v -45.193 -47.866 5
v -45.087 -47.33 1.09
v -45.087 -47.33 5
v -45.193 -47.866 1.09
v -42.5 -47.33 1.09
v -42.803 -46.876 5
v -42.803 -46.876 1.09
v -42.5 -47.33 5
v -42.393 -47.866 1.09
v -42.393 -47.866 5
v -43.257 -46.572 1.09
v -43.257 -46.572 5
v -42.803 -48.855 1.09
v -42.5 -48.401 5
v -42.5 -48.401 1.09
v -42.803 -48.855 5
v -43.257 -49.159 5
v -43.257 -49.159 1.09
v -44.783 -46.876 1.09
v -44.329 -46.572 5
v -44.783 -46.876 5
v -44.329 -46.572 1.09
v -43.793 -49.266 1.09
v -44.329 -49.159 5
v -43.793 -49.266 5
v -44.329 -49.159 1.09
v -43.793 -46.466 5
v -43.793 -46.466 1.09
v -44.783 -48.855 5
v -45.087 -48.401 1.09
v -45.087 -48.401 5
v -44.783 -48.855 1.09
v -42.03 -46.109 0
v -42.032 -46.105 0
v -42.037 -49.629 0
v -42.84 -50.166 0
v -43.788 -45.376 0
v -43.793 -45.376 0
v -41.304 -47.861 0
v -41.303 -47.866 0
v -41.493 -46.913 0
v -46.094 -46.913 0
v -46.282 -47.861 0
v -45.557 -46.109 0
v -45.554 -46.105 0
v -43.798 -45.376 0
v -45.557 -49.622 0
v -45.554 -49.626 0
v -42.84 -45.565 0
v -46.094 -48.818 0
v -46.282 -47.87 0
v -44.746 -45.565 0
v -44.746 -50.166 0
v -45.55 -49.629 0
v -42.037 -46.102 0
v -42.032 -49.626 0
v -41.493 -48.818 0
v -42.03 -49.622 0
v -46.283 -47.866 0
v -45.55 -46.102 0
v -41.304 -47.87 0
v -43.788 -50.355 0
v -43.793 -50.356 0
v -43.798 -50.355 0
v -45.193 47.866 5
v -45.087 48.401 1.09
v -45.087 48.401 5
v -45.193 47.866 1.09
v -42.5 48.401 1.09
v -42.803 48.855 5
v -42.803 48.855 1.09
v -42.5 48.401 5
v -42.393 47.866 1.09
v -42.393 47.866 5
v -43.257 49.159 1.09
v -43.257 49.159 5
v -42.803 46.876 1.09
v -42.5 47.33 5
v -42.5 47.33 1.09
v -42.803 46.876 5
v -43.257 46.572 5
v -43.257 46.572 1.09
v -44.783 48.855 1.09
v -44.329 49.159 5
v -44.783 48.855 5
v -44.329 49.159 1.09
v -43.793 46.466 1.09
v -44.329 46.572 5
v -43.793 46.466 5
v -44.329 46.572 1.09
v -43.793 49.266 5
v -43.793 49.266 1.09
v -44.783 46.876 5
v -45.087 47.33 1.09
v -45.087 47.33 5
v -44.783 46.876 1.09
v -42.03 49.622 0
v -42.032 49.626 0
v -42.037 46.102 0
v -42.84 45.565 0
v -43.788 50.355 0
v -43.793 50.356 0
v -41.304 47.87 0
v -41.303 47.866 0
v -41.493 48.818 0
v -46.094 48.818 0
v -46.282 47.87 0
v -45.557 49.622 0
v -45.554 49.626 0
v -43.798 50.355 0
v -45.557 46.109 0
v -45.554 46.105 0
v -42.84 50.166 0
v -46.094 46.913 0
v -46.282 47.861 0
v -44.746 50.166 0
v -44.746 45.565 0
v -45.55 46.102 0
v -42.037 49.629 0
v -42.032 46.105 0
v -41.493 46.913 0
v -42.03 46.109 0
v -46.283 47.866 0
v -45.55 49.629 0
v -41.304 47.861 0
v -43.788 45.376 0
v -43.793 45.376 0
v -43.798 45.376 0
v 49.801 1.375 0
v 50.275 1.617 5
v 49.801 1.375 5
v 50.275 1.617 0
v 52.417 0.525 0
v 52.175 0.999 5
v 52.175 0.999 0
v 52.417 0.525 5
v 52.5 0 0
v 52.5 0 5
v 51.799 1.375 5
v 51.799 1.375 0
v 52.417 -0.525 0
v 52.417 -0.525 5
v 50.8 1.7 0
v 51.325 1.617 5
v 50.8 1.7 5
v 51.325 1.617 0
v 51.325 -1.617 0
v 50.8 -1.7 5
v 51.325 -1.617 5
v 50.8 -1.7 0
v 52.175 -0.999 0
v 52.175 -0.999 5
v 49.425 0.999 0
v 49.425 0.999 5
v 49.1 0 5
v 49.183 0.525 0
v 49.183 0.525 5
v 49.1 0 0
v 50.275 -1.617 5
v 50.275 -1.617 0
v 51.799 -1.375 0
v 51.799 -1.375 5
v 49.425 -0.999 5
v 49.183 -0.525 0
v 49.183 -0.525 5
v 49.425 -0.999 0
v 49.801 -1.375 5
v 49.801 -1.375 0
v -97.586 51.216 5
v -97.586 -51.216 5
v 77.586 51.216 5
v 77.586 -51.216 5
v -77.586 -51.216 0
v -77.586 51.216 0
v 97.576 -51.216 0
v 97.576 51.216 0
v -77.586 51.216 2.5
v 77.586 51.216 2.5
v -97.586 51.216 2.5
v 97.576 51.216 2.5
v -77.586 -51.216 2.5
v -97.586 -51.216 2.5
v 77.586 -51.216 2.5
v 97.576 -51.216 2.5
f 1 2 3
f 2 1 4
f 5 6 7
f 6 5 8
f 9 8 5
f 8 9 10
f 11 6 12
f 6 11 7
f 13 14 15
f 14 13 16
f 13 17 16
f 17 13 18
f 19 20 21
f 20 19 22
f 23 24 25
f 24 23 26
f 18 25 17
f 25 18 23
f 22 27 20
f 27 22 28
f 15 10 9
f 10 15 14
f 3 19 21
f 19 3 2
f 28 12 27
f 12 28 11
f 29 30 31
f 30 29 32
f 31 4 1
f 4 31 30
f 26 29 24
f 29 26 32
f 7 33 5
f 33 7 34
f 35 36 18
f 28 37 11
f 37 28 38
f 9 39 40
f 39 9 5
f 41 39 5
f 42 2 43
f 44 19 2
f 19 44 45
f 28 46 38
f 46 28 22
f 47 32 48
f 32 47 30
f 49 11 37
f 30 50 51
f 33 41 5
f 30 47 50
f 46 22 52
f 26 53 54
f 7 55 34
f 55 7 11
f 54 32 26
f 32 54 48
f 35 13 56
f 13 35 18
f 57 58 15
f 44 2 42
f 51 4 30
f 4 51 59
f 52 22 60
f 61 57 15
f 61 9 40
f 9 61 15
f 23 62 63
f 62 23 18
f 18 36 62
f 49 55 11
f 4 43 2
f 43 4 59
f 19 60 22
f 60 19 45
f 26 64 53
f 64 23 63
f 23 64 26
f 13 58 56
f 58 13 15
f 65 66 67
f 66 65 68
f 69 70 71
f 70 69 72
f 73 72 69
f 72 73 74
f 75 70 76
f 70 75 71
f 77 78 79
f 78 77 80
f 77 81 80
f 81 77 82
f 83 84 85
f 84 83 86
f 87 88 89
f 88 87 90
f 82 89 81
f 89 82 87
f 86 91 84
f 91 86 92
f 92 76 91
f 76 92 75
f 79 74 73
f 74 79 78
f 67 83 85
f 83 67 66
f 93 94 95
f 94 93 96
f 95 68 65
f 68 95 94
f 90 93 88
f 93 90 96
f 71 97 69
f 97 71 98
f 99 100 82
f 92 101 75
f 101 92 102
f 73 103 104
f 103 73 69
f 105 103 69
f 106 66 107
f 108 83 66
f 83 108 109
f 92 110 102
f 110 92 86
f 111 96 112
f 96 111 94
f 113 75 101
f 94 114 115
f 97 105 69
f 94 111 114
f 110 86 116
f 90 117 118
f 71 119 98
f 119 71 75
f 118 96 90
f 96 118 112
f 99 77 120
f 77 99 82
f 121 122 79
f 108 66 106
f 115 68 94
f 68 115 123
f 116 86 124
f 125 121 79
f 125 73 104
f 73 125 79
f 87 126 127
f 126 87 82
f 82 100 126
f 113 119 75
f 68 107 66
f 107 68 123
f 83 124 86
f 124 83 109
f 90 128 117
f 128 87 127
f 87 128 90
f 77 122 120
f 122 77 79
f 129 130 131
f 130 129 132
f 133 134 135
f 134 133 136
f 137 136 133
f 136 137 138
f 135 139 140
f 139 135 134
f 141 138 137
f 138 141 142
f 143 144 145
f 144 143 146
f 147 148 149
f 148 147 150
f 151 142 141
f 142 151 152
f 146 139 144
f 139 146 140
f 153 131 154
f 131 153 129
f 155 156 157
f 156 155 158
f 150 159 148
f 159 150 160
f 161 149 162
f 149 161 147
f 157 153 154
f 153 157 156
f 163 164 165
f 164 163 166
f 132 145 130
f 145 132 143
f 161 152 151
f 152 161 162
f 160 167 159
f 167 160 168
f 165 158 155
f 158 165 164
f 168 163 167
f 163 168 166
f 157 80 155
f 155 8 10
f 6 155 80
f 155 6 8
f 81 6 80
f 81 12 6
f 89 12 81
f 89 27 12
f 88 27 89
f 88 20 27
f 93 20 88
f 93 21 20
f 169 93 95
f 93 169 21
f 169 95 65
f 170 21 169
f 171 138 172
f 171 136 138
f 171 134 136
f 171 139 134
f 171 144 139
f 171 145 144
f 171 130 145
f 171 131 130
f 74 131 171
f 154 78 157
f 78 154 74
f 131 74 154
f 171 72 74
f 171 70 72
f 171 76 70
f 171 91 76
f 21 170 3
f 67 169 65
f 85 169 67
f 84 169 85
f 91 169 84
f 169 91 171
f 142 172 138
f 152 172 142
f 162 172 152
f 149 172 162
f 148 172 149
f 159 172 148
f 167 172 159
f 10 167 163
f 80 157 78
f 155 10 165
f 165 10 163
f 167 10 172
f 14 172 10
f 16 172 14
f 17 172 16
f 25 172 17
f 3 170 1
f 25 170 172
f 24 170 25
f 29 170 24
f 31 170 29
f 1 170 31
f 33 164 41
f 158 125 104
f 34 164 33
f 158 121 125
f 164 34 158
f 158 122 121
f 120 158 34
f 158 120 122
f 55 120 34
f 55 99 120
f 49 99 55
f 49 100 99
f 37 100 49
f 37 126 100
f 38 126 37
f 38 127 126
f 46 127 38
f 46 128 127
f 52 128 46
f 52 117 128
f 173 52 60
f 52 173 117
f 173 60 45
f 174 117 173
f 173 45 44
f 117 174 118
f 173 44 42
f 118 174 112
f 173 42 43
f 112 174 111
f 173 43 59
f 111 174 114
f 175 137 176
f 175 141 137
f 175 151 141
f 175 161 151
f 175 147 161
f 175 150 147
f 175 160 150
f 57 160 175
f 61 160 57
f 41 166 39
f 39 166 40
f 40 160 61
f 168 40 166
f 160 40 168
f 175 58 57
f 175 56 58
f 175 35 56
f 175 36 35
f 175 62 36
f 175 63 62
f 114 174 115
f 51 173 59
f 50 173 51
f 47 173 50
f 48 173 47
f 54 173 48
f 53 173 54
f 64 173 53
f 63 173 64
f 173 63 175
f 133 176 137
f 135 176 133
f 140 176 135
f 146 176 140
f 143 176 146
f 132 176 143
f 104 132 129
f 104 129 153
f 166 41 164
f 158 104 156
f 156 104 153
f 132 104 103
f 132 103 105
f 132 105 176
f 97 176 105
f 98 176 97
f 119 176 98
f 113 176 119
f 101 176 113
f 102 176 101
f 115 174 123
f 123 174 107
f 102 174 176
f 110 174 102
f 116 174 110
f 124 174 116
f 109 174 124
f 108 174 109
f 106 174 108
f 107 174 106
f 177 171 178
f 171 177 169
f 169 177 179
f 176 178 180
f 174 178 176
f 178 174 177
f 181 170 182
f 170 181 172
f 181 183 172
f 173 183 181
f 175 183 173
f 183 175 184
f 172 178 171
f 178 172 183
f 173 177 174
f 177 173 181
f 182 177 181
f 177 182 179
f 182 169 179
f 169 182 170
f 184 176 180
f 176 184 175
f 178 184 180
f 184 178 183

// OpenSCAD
// file: ../../library/e7_all.scad
// ==========================================================================
//  e7_all.scad - include this one file. Preview, print plates and the report.
// ==========================================================================
include <e7_params.scad>
include <e7_body.scad>

// whole painted loco
module e7_preview() {
  // carbody in its paint bands
  for (i = [0:len(PAINT_BANDS) - 1]) {
    z0 = i == 0 ? -1 : p(PAINT_BANDS[i - 1][0]);
    z1 = i == len(PAINT_BANDS) - 1 ? 1000 : p(PAINT_BANDS[i][0]);
    color(PAINT_BANDS[i][1]) render(convexity = 8) e7_shell_solid([z0, z1]);
  }
  color(C_GLASS) e7_glass();
  color(C_LENS) let (d = nose_d_at_z(HEADLIGHT[0]))
    translate([XF - p(d) + p(HEADLIGHT[2]) + p(1.5), 0, p(HEADLIGHT[0])]) rotate([0, 90, 0]) cylinder(d = p(HEADLIGHT[1]) - 0.8, h = 0.5, $fn = 32);
  color(C_FRAME) { for (j = [1:NFRAME]) e7_frame_piece(j); e7_pilot(); e7_pilot_rear(); }
  for (tx = [TRK_X, -TRK_X]) translate([tx, 0, 0]) { color(C_TRUCK) e7_truck_frame(); color(C_WHEEL) e7_wheels(); }
}
// thin glass panes sitting in the window pockets (preview only)
module e7_glass() {
  intersection() { e7_loft(DET * 0.6); union() { e7_windshield_cut(); e7_side_cuts_windows_only(); } }
}
module e7_side_cuts_windows_only() {
  for (s = [-1, 1], w = CAB_WIN)
    translate([XF - p(w[1]), s * HW - (s > 0 ? DET : 3 - DET), p(w[2])]) cube([p(w[1] - w[0]), 3, p(w[3] - w[2])]);
}

// one print, laid out for the printer
module e7_plate(part) {
  sec = [for (k = [1:NSEC]) str("body_", k)];
  frm = [for (j = [1:NFRAME]) str("frame_", j)];
  if (is_num(search([part], sec)[0])) {
    k = search([part], sec)[0] + 1;
    // stand the section on its open bottom (skirt edge on the bed)
    translate([-sec_x0(k) - SEC_L / 2, 0, -Z_SKIRT]) e7_body_section(k);
  } else if (is_num(search([part], frm)[0])) {
    j = search([part], frm)[0] + 1;
    xs = concat([FRAME_X0], FRAME_SPLITS, [FRAME_X1]);
    translate([-(xs[j - 1] + xs[j]) / 2, 0, -Z_FRAME_BOT]) e7_frame_piece(j);
  } else if (part == "pilot") {
    translate([-XF, 0, 0]) rotate([0, 0, 0]) translate([0, 0, -p(5)]) e7_pilot();
  } else if (part == "pilot_rear") {
    translate([-XR, 0, 0]) translate([0, 0, -(CPL_Z - CPL_H / 2 - WALL)]) e7_pilot_rear();
  } else if (part == "truck") {
    // upside down, bolster on the bed
    translate([0, 0, Z_FRAME_BOT - 0.3]) rotate([180, 0, 0]) e7_truck_frame();
  } else {
    assert(false, str("unknown part '", part, "'"));
  }
}

module e7_report() {
  echo(str("MILW E7A ", ROAD_NO, " class ", CLASS, " - ", SC, " scale 1:", RATIO, ", paint ", PAINT));
  echo(str("  carbody ", round(BL), " mm long, ", round(2 * HW), " mm wide, roof ", round(Z_ROOF), " mm, cab ", round(Z_CAB), " mm above rail"));
  echo(str("  ", NSEC, " body sections of ", round(SEC_L), " mm; ", NFRAME, " frame pieces; trucks at +/- ", round(TRK_X), " mm"));
  echo(str("  body screws ", SCREW_BODY_NAME, " x ", 2 * len(BOSS_X), "; truck pivots ", PIVOT[1], "; wheels ", round(WHEEL_D * 10) / 10, " mm (bought)"));
}
// main file
// Milwaukee Road E7A, G scale 1-29 - print 8 of 12: frame_4 - frame plate piece 4 (print flat)
// Render (F6), export STL, print. Settings: ../../library/e7_params.scad
// Whole loco preview and notes: ../../MILW_E7_Main.scad
SCALE_SEL = "G";
include <../../library/e7_all.scad>
e7_plate("frame_4");
